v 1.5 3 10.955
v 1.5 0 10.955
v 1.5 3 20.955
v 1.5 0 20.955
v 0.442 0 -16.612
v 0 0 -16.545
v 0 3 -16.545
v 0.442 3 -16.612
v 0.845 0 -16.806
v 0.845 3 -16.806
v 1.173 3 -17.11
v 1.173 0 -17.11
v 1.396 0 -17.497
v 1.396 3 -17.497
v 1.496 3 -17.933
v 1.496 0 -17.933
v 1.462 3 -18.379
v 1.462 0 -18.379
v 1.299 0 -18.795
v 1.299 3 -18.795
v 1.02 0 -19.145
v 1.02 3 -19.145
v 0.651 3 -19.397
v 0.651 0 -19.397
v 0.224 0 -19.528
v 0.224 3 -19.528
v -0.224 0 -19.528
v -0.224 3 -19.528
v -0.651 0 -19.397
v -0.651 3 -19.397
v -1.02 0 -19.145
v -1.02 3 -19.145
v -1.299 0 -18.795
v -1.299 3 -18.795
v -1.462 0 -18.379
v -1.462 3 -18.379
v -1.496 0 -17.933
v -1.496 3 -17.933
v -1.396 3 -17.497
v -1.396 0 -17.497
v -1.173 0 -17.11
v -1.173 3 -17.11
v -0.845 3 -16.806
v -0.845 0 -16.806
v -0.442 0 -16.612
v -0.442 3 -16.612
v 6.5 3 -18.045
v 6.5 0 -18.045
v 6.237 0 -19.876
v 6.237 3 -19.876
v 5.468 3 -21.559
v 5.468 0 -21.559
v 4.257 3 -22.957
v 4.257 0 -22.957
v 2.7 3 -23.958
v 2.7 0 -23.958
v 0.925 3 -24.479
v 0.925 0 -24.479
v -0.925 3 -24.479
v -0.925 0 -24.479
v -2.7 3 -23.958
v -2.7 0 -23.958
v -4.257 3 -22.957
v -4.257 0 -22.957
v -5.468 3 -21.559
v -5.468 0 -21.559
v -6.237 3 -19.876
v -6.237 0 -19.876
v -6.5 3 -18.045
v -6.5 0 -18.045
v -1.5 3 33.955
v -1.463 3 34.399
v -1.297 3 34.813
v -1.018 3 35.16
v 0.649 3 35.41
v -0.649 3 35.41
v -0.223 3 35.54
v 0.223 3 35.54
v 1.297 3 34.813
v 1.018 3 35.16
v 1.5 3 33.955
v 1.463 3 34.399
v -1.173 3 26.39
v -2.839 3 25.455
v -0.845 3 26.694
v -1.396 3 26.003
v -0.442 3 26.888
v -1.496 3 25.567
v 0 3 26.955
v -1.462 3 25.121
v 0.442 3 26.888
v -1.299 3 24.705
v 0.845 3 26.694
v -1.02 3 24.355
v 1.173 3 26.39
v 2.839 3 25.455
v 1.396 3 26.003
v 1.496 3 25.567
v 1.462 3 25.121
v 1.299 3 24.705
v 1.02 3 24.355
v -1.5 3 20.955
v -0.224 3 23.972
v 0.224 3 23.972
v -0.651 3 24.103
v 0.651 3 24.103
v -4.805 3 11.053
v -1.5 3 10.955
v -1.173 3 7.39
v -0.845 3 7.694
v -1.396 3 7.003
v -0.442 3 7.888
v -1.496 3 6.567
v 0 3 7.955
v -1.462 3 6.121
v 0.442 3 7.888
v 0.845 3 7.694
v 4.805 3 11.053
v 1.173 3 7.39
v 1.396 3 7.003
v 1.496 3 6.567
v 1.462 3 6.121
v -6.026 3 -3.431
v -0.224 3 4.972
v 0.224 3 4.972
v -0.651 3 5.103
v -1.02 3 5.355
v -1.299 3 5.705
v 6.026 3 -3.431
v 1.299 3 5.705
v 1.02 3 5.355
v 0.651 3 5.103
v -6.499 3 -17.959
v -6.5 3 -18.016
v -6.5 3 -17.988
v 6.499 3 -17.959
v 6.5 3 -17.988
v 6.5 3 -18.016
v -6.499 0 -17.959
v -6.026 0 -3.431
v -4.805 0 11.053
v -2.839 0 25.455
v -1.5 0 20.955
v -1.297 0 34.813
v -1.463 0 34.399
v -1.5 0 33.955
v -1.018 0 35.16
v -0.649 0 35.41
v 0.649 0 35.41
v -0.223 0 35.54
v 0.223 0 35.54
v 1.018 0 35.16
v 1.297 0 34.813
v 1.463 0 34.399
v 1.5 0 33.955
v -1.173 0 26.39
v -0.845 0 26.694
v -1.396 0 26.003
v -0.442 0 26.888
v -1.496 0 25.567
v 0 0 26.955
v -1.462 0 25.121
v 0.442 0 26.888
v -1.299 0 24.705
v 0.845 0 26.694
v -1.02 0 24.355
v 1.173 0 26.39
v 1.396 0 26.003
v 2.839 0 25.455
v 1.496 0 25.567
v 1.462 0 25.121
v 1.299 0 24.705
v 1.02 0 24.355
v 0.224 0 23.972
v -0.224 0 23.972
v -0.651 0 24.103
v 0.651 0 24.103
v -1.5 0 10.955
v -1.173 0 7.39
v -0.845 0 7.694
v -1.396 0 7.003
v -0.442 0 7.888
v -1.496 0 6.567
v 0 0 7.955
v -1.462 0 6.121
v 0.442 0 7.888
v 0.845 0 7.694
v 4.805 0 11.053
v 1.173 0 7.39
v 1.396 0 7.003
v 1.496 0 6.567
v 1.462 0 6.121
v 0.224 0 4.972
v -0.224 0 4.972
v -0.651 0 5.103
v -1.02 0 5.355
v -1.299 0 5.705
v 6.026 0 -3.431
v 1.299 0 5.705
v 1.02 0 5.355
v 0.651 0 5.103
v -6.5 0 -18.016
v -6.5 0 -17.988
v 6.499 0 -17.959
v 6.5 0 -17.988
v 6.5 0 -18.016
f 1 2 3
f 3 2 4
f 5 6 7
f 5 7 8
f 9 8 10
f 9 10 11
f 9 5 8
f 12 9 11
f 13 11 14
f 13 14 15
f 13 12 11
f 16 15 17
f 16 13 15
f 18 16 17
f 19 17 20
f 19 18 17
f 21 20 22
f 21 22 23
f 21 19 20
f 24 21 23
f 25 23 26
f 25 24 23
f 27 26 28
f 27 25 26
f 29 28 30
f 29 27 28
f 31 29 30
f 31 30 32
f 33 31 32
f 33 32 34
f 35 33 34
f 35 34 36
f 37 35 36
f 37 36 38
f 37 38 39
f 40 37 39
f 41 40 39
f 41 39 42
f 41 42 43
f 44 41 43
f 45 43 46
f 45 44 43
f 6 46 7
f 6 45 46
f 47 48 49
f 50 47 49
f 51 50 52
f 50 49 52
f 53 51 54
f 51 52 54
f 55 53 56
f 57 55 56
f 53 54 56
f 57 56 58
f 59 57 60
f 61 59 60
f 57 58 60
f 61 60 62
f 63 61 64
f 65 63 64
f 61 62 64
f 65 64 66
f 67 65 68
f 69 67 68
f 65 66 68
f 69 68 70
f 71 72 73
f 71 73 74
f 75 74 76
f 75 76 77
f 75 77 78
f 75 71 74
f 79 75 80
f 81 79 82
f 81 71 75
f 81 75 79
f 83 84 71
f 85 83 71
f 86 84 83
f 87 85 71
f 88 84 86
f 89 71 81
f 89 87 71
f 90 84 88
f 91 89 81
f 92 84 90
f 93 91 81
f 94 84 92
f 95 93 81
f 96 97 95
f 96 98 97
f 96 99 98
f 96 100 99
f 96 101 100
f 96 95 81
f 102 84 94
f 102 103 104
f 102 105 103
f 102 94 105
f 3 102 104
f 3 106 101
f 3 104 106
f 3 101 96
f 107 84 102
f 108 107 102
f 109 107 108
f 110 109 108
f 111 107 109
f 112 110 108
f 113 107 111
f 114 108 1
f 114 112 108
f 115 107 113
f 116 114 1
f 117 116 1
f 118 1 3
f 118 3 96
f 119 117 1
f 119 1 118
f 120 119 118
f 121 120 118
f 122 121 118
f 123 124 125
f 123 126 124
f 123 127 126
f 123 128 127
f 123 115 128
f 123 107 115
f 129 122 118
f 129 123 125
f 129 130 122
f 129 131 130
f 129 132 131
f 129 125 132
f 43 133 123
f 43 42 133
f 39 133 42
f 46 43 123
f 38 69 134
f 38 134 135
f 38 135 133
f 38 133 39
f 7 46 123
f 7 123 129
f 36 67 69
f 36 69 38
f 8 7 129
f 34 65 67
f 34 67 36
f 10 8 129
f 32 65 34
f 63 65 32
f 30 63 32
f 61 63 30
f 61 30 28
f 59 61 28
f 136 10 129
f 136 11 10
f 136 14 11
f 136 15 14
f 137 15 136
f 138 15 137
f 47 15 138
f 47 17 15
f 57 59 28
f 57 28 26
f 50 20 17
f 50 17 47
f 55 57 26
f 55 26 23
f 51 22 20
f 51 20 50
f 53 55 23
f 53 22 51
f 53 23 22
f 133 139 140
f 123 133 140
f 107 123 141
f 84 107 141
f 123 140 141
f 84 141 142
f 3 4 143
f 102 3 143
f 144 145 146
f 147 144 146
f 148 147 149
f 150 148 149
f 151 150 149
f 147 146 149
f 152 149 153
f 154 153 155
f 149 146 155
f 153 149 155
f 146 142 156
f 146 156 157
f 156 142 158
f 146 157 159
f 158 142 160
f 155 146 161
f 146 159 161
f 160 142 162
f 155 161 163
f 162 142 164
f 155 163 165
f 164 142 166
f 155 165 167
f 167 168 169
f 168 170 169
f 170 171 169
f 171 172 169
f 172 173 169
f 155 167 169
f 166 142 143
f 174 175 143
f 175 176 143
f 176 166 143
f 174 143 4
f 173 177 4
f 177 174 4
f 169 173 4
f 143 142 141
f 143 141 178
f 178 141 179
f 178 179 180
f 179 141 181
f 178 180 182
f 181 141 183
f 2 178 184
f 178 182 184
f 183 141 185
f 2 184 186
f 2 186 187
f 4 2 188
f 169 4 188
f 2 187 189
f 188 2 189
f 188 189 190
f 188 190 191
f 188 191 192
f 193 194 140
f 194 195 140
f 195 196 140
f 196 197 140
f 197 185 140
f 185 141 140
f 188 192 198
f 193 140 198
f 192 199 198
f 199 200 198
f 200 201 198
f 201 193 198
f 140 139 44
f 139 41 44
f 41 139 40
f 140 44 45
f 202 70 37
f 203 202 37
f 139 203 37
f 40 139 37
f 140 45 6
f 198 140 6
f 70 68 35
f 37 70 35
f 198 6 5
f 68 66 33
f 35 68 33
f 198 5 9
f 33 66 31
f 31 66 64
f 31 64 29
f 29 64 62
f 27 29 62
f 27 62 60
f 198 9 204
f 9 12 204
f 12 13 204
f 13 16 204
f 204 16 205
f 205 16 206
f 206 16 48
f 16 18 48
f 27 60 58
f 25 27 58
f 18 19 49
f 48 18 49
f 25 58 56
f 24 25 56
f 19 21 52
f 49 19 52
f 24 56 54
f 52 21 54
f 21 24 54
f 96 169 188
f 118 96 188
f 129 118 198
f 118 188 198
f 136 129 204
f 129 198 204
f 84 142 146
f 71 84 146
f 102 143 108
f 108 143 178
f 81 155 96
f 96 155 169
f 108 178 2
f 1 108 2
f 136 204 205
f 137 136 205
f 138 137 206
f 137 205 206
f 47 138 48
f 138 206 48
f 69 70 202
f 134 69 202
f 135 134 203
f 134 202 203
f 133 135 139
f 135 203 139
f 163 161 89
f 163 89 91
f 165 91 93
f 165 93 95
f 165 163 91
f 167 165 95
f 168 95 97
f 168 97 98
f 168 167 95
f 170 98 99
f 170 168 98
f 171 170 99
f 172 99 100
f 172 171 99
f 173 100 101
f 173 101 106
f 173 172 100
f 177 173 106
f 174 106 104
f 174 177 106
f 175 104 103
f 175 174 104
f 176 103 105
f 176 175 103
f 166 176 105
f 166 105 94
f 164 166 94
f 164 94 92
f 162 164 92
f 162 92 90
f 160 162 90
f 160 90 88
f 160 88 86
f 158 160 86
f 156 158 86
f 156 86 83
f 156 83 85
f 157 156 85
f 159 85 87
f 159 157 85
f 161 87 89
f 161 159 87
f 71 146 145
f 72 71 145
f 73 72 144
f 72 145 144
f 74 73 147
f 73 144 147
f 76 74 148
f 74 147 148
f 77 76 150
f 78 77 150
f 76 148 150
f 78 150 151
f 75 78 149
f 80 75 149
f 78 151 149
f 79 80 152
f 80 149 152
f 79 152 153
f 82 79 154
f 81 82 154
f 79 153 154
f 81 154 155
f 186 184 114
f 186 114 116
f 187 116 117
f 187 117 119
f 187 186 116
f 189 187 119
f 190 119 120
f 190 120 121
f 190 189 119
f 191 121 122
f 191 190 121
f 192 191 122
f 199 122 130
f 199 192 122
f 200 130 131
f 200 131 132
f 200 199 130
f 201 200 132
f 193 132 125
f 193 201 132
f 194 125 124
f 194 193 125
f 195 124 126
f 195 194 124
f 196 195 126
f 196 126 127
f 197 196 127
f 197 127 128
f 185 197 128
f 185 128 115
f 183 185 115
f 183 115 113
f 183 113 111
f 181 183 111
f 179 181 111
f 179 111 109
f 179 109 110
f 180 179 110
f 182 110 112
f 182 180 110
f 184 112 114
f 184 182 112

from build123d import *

# Parameters (mm, degrees)
ESBO_O1_R                = 1.5
RESSALTO_EXTRUS_O1_DEPTH = 3


with BuildPart() as part:
    # Esboço1 → Ressalto-extrusão1 (new body)
    with BuildSketch(Plane(origin=(0, 0, 0), x_dir=(1, 0, 0), z_dir=(0, 1, 0))):
        with BuildLine():
            Line((-2.838975028, -25.45488959), (-1.5, -33.95488959))
            ThreePointArc((-1.5, -33.95488959), (0, -35.556863977), (1.5, -33.95488959))
            Line((1.5, -33.95488959), (2.838975028, -25.45488959))
            ThreePointArc((2.838975028, -25.45488959), (5.508963035, -3.818784756), (6.499428658, 17.958929684))
            ThreePointArc((6.499428658, 17.958929684), (6.499717622, 18.002020025), (6.5, 18.04511041))
            ThreePointArc((6.5, 18.04511041), (0, 24.54511041), (-6.5, 18.04511041))
            ThreePointArc((-6.5, 18.04511041), (-6.499717622, 18.002020025), (-6.499428658, 17.958929683))
            ThreePointArc((-6.499428658, 17.958929683), (-5.508963035, -3.818784756), (-2.838975028, -25.45488959))
        make_face()
        with Locations(Location((0, -25.45488959, 0), (0, 0, 270))):
            Circle(ESBO_O1_R, mode=Mode.SUBTRACT)
        Polygon((-1.5, -10.95488959), (0, -10.95488959), (1.5, -10.95488959), (1.5, -20.95488959), (0, -20.95488959), (-1.5, -20.95488959), align=None, mode=Mode.SUBTRACT)
        with Locations(Location((0, -6.45488959, 0), (0, 0, 270))):
            Circle(ESBO_O1_R, mode=Mode.SUBTRACT)
        with Locations(Location((0, 18.04511041, 0), (0, 0, 270))):
            Circle(ESBO_O1_R, mode=Mode.SUBTRACT)
    extrude(amount=RESSALTO_EXTRUS_O1_DEPTH)


solid = part.part
